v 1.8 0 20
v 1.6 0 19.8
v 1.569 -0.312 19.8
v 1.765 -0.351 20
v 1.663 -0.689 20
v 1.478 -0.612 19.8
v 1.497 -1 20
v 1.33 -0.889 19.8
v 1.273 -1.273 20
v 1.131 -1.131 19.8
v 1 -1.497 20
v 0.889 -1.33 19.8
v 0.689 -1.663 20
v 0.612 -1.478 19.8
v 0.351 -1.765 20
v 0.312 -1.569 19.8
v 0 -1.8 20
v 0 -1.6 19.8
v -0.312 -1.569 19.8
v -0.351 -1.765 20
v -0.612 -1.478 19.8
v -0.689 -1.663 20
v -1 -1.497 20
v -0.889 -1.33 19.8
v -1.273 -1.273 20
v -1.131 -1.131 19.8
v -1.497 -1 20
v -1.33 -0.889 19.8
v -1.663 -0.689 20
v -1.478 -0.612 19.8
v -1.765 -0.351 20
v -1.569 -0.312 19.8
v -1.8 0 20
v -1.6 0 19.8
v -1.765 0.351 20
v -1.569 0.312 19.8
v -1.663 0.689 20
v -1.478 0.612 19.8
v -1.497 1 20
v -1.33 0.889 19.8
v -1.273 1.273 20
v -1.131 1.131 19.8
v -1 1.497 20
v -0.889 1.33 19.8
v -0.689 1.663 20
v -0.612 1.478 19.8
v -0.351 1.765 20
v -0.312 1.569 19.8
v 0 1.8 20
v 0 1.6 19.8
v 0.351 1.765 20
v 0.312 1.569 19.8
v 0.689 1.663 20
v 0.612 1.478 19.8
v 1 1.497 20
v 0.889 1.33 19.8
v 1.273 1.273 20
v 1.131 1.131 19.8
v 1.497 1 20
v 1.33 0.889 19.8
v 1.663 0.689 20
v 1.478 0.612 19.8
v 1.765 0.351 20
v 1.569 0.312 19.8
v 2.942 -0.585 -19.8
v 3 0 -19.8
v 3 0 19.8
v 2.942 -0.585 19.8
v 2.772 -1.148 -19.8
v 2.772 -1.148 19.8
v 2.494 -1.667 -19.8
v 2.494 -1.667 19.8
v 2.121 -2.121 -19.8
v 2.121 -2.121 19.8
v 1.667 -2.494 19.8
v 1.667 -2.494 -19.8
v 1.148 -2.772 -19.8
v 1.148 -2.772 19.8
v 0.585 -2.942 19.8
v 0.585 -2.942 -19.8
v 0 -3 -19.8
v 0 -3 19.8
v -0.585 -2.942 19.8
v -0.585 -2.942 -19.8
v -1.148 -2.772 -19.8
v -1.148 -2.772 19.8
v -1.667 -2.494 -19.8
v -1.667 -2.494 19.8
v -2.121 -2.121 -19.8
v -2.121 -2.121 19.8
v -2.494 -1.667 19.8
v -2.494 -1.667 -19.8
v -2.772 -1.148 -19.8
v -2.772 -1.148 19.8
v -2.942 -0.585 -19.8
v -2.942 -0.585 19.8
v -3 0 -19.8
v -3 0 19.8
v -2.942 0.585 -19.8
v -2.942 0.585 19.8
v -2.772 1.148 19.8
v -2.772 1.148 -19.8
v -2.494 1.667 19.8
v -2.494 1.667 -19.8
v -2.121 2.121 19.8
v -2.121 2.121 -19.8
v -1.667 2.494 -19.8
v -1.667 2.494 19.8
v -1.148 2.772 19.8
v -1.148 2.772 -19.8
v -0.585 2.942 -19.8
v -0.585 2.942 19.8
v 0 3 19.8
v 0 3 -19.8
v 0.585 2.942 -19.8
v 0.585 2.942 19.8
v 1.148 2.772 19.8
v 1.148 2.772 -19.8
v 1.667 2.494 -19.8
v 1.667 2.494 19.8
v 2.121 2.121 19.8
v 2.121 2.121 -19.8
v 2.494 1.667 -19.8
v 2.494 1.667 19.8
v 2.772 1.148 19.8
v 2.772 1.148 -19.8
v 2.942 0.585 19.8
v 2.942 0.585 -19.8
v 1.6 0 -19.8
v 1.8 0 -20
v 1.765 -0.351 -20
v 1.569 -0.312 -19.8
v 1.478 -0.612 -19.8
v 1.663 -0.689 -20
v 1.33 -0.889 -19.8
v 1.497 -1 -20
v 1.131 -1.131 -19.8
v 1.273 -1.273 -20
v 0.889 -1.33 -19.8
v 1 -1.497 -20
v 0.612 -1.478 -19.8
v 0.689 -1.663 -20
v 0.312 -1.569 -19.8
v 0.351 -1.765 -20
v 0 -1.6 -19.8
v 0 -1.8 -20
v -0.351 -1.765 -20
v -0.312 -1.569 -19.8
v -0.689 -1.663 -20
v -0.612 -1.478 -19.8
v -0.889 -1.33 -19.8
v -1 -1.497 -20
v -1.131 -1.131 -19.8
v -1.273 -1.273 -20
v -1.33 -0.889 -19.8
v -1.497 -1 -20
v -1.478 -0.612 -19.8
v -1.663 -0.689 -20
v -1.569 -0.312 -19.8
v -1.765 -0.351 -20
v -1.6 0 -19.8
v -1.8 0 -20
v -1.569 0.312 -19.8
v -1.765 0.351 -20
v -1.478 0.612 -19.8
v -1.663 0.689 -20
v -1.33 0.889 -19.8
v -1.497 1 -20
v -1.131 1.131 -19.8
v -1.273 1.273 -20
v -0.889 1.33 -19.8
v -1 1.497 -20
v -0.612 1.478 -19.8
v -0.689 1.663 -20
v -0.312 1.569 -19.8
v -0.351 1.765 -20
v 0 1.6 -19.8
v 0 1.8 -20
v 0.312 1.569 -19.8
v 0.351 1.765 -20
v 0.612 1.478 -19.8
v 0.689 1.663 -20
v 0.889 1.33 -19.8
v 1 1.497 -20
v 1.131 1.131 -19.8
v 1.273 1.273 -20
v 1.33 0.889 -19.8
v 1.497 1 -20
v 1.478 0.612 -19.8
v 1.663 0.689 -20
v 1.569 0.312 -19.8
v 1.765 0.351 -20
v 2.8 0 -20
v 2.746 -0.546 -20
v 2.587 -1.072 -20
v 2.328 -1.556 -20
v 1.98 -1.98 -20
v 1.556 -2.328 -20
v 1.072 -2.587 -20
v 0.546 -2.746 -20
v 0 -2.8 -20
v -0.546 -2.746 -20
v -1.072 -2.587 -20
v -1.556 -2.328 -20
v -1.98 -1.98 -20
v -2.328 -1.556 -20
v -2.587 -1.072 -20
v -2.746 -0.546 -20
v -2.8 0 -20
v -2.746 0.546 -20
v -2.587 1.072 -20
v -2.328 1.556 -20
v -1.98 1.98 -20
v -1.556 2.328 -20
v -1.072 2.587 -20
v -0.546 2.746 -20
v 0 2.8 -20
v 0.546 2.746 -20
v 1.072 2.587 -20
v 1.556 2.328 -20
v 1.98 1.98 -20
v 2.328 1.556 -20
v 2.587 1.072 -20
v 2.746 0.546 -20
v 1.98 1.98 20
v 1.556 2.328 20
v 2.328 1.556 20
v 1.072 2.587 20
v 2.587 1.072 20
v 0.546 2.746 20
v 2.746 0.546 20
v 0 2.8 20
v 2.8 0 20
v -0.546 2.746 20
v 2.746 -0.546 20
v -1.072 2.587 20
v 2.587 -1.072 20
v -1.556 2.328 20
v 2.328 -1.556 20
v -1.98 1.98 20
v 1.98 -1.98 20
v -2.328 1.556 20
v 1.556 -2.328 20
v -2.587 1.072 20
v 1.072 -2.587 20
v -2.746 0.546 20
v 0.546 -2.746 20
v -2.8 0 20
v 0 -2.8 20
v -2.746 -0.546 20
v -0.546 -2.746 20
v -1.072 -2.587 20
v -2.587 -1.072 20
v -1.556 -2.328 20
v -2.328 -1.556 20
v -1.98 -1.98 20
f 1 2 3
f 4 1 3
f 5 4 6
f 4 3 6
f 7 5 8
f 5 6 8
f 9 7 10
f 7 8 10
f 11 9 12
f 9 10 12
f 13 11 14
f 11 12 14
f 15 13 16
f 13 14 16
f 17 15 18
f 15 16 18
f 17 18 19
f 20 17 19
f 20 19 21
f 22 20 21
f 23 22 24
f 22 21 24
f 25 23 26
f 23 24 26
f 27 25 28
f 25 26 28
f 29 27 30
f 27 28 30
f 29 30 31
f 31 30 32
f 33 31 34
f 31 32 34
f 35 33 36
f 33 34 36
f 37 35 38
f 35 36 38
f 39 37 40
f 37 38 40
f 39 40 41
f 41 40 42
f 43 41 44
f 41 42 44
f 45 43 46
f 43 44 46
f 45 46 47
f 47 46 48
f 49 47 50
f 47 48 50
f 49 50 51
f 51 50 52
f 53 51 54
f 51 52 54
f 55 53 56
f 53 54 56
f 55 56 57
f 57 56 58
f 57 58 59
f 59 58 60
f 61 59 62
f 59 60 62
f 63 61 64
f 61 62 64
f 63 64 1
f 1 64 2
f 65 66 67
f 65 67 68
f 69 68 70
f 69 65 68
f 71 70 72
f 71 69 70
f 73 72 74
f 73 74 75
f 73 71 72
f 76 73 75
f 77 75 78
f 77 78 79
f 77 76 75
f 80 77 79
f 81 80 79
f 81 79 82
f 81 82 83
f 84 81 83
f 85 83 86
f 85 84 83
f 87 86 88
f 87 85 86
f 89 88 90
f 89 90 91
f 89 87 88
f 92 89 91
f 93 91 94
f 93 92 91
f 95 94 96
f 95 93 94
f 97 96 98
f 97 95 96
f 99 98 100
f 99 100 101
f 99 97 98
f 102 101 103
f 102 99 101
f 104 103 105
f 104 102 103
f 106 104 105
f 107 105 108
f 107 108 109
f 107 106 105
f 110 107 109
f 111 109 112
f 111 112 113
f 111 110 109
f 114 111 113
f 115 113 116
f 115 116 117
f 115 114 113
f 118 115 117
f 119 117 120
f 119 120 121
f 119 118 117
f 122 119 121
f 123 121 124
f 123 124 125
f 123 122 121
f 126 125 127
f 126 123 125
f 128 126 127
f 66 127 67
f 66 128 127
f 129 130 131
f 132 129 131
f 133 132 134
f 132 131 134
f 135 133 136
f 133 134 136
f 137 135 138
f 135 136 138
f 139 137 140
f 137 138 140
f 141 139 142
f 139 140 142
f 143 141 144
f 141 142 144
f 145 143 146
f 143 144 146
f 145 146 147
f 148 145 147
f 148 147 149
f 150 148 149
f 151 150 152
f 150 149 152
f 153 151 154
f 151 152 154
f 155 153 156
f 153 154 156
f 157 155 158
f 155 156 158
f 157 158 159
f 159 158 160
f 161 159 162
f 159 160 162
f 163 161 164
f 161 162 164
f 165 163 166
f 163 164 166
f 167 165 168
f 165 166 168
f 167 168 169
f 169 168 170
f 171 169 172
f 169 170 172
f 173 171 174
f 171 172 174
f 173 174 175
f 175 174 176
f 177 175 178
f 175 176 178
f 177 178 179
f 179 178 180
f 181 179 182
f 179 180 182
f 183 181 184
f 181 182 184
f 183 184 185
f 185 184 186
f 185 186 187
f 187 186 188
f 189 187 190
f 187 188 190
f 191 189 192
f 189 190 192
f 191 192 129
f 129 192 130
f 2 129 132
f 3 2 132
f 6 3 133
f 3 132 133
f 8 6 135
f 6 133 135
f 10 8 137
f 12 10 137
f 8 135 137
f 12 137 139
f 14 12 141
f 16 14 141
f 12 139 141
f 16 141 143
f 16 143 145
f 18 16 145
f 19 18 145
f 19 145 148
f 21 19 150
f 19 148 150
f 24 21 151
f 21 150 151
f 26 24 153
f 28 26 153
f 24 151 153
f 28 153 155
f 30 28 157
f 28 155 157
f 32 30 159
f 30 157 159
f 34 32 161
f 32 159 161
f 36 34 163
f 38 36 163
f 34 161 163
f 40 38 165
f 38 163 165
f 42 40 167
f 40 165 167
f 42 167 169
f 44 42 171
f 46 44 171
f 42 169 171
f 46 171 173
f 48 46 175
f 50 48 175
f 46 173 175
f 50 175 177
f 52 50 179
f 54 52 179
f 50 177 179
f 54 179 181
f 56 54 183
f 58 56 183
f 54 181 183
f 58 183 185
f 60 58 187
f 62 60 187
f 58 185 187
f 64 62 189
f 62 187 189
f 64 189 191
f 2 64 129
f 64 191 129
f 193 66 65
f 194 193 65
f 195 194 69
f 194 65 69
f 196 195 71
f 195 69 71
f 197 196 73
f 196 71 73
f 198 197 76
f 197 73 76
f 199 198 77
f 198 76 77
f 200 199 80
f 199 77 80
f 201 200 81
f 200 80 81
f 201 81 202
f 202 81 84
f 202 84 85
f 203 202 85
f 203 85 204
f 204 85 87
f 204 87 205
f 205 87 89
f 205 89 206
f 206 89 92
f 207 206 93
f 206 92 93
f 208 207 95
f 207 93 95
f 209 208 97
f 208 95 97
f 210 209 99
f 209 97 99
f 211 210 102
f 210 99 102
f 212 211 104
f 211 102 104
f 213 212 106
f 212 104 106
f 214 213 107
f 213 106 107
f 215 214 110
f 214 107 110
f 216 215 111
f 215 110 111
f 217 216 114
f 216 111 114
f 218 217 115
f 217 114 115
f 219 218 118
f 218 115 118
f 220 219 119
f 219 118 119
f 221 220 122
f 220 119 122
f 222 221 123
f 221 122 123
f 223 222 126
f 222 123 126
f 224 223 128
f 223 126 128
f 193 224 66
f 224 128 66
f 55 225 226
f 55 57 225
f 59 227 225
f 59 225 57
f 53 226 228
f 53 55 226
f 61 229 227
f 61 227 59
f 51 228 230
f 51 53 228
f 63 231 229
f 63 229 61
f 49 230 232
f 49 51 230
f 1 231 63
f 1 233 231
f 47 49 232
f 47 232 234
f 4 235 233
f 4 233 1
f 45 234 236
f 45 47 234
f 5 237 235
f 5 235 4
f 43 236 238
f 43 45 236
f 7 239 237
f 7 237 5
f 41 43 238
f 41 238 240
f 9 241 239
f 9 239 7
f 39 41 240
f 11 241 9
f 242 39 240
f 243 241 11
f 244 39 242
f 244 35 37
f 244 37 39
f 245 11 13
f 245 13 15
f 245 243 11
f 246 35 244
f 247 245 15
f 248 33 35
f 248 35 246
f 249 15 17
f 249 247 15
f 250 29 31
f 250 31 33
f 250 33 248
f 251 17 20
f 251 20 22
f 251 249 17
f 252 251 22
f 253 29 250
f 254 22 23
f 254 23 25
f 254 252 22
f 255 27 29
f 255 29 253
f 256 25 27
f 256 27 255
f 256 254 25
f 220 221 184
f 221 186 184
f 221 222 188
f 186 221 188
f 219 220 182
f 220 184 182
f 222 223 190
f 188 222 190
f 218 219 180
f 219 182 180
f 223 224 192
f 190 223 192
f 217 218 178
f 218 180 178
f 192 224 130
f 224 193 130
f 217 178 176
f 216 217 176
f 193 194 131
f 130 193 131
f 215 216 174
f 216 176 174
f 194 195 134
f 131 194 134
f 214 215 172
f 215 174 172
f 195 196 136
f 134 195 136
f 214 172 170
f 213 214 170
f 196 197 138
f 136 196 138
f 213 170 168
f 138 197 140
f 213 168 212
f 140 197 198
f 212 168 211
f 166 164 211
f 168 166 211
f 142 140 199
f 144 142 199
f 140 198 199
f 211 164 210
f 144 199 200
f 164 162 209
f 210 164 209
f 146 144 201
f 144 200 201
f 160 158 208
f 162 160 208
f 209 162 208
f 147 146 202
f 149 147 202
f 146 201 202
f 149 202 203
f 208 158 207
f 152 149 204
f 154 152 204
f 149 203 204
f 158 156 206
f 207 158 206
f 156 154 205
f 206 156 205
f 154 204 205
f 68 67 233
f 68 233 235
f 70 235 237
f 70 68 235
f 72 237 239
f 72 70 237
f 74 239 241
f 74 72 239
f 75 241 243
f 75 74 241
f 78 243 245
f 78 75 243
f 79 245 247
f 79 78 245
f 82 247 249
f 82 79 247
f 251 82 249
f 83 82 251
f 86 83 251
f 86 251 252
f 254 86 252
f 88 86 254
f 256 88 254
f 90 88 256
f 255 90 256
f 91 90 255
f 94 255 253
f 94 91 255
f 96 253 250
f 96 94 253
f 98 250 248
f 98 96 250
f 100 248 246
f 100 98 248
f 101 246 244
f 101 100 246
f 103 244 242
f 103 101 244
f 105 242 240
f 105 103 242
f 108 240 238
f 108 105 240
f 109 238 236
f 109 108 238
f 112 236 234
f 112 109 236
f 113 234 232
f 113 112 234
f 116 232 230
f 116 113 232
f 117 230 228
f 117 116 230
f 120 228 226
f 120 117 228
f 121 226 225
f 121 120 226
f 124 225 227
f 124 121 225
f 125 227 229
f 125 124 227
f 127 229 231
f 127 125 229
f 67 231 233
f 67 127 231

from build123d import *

# Parameters (mm, degrees)
SKETCH_1_W     = 40
SKETCH_1_H     = 1.4
CHAMFER_1_SIZE = 0.2


with BuildPart() as part:
    # ｽｹｯﾁ1 → 回転1 (revolve)
    with BuildSketch(Plane(origin=(0, 0, 0), x_dir=(0, 0, -1), z_dir=(1, 0, 0)), mode=Mode.PRIVATE) as revolve_1_sk:
        with Locations((0, 2.3)):
            Rectangle(SKETCH_1_W, SKETCH_1_H)
    revolve(revolve_1_sk.sketch.rotate(Axis((0, 0, 7.128099174), (0, 0, -1)), 90), axis=Axis((0, 0, 7.128099174), (0, 0, -1)))

    # 面取り1
    chamfer_1_edges = [part.edges().sort_by_distance(p)[0] for p in [
        (-3, 0, 20),
        (-3, 0, -20),
        (-1.6, 0, -20),
        (-1.6, 0, 20),
    ]]
    chamfer(chamfer_1_edges, length=CHAMFER_1_SIZE)


solid = part.part
